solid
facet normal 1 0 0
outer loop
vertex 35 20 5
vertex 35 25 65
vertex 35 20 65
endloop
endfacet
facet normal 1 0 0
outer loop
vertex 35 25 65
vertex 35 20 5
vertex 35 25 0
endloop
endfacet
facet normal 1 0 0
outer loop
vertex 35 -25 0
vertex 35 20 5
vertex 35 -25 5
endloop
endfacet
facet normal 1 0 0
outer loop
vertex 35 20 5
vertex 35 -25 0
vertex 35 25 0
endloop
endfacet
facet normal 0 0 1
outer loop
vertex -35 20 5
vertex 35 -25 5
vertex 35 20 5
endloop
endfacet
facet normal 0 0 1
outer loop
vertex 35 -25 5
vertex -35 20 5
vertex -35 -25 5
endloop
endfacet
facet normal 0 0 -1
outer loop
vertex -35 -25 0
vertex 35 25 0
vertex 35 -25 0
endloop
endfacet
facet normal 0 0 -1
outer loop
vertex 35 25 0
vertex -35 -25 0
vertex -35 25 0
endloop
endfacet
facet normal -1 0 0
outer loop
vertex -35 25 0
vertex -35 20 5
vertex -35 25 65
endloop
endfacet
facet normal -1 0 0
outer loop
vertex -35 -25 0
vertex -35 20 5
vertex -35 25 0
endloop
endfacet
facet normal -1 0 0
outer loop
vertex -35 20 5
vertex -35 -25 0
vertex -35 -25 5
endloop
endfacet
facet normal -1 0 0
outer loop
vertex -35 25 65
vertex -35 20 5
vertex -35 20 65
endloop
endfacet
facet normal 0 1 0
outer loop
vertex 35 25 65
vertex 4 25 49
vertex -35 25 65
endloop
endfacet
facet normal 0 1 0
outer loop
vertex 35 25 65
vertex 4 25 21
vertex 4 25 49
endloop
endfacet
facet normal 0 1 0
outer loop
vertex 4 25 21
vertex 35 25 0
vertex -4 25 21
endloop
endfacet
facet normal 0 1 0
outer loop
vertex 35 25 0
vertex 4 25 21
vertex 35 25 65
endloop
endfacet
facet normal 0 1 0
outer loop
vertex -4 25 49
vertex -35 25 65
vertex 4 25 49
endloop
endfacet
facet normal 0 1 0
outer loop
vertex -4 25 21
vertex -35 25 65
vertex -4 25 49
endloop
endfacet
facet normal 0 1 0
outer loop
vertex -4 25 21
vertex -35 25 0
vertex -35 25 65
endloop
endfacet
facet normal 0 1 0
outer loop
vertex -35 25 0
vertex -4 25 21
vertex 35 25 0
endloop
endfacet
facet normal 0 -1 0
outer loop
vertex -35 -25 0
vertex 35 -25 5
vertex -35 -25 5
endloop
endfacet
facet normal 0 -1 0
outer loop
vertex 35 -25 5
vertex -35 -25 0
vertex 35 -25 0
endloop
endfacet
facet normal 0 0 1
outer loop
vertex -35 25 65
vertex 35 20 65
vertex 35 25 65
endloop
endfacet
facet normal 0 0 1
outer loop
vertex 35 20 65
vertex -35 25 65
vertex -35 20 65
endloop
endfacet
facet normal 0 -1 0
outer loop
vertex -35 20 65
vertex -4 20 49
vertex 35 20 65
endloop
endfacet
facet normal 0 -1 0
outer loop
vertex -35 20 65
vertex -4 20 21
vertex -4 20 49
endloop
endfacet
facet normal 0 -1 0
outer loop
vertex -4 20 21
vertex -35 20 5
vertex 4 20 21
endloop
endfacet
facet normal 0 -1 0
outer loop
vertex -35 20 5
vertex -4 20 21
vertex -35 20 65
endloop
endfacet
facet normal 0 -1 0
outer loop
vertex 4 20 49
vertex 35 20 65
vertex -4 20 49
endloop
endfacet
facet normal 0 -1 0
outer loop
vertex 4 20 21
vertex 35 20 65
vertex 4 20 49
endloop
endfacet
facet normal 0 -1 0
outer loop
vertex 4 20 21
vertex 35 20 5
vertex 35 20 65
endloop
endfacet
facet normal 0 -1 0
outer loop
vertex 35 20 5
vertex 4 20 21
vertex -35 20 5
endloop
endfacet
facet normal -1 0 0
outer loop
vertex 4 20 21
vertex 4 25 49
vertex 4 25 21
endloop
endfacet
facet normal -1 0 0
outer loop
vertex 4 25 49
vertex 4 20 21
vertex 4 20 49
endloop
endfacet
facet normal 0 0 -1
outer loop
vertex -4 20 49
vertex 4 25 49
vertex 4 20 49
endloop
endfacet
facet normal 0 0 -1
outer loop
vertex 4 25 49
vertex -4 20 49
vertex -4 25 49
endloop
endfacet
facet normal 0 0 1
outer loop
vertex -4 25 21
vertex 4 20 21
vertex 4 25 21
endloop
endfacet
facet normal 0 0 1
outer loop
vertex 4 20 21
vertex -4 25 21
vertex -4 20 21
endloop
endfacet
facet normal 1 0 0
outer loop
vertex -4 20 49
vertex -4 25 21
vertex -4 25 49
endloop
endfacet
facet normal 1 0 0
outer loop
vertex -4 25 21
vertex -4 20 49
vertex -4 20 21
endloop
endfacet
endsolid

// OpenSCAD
// Starter bracket parameters for task-021.
$fn = 48;

width = 70;
depth = 50;
base_height = 5;
back_height = 60;
back_thickness = 5;
slot_width = 8;
slot_height = 28;

difference() {
  union() {
    translate([-width / 2, -depth / 2, 0])
      cube([width, depth, base_height]);
    translate([-width / 2, depth / 2 - back_thickness, base_height])
      cube([width, back_thickness, back_height]);
  }

  translate([0, depth / 2 - back_thickness / 2, base_height + back_height / 2])
    cube([slot_width, back_thickness + 3, slot_height], center = true);
}
